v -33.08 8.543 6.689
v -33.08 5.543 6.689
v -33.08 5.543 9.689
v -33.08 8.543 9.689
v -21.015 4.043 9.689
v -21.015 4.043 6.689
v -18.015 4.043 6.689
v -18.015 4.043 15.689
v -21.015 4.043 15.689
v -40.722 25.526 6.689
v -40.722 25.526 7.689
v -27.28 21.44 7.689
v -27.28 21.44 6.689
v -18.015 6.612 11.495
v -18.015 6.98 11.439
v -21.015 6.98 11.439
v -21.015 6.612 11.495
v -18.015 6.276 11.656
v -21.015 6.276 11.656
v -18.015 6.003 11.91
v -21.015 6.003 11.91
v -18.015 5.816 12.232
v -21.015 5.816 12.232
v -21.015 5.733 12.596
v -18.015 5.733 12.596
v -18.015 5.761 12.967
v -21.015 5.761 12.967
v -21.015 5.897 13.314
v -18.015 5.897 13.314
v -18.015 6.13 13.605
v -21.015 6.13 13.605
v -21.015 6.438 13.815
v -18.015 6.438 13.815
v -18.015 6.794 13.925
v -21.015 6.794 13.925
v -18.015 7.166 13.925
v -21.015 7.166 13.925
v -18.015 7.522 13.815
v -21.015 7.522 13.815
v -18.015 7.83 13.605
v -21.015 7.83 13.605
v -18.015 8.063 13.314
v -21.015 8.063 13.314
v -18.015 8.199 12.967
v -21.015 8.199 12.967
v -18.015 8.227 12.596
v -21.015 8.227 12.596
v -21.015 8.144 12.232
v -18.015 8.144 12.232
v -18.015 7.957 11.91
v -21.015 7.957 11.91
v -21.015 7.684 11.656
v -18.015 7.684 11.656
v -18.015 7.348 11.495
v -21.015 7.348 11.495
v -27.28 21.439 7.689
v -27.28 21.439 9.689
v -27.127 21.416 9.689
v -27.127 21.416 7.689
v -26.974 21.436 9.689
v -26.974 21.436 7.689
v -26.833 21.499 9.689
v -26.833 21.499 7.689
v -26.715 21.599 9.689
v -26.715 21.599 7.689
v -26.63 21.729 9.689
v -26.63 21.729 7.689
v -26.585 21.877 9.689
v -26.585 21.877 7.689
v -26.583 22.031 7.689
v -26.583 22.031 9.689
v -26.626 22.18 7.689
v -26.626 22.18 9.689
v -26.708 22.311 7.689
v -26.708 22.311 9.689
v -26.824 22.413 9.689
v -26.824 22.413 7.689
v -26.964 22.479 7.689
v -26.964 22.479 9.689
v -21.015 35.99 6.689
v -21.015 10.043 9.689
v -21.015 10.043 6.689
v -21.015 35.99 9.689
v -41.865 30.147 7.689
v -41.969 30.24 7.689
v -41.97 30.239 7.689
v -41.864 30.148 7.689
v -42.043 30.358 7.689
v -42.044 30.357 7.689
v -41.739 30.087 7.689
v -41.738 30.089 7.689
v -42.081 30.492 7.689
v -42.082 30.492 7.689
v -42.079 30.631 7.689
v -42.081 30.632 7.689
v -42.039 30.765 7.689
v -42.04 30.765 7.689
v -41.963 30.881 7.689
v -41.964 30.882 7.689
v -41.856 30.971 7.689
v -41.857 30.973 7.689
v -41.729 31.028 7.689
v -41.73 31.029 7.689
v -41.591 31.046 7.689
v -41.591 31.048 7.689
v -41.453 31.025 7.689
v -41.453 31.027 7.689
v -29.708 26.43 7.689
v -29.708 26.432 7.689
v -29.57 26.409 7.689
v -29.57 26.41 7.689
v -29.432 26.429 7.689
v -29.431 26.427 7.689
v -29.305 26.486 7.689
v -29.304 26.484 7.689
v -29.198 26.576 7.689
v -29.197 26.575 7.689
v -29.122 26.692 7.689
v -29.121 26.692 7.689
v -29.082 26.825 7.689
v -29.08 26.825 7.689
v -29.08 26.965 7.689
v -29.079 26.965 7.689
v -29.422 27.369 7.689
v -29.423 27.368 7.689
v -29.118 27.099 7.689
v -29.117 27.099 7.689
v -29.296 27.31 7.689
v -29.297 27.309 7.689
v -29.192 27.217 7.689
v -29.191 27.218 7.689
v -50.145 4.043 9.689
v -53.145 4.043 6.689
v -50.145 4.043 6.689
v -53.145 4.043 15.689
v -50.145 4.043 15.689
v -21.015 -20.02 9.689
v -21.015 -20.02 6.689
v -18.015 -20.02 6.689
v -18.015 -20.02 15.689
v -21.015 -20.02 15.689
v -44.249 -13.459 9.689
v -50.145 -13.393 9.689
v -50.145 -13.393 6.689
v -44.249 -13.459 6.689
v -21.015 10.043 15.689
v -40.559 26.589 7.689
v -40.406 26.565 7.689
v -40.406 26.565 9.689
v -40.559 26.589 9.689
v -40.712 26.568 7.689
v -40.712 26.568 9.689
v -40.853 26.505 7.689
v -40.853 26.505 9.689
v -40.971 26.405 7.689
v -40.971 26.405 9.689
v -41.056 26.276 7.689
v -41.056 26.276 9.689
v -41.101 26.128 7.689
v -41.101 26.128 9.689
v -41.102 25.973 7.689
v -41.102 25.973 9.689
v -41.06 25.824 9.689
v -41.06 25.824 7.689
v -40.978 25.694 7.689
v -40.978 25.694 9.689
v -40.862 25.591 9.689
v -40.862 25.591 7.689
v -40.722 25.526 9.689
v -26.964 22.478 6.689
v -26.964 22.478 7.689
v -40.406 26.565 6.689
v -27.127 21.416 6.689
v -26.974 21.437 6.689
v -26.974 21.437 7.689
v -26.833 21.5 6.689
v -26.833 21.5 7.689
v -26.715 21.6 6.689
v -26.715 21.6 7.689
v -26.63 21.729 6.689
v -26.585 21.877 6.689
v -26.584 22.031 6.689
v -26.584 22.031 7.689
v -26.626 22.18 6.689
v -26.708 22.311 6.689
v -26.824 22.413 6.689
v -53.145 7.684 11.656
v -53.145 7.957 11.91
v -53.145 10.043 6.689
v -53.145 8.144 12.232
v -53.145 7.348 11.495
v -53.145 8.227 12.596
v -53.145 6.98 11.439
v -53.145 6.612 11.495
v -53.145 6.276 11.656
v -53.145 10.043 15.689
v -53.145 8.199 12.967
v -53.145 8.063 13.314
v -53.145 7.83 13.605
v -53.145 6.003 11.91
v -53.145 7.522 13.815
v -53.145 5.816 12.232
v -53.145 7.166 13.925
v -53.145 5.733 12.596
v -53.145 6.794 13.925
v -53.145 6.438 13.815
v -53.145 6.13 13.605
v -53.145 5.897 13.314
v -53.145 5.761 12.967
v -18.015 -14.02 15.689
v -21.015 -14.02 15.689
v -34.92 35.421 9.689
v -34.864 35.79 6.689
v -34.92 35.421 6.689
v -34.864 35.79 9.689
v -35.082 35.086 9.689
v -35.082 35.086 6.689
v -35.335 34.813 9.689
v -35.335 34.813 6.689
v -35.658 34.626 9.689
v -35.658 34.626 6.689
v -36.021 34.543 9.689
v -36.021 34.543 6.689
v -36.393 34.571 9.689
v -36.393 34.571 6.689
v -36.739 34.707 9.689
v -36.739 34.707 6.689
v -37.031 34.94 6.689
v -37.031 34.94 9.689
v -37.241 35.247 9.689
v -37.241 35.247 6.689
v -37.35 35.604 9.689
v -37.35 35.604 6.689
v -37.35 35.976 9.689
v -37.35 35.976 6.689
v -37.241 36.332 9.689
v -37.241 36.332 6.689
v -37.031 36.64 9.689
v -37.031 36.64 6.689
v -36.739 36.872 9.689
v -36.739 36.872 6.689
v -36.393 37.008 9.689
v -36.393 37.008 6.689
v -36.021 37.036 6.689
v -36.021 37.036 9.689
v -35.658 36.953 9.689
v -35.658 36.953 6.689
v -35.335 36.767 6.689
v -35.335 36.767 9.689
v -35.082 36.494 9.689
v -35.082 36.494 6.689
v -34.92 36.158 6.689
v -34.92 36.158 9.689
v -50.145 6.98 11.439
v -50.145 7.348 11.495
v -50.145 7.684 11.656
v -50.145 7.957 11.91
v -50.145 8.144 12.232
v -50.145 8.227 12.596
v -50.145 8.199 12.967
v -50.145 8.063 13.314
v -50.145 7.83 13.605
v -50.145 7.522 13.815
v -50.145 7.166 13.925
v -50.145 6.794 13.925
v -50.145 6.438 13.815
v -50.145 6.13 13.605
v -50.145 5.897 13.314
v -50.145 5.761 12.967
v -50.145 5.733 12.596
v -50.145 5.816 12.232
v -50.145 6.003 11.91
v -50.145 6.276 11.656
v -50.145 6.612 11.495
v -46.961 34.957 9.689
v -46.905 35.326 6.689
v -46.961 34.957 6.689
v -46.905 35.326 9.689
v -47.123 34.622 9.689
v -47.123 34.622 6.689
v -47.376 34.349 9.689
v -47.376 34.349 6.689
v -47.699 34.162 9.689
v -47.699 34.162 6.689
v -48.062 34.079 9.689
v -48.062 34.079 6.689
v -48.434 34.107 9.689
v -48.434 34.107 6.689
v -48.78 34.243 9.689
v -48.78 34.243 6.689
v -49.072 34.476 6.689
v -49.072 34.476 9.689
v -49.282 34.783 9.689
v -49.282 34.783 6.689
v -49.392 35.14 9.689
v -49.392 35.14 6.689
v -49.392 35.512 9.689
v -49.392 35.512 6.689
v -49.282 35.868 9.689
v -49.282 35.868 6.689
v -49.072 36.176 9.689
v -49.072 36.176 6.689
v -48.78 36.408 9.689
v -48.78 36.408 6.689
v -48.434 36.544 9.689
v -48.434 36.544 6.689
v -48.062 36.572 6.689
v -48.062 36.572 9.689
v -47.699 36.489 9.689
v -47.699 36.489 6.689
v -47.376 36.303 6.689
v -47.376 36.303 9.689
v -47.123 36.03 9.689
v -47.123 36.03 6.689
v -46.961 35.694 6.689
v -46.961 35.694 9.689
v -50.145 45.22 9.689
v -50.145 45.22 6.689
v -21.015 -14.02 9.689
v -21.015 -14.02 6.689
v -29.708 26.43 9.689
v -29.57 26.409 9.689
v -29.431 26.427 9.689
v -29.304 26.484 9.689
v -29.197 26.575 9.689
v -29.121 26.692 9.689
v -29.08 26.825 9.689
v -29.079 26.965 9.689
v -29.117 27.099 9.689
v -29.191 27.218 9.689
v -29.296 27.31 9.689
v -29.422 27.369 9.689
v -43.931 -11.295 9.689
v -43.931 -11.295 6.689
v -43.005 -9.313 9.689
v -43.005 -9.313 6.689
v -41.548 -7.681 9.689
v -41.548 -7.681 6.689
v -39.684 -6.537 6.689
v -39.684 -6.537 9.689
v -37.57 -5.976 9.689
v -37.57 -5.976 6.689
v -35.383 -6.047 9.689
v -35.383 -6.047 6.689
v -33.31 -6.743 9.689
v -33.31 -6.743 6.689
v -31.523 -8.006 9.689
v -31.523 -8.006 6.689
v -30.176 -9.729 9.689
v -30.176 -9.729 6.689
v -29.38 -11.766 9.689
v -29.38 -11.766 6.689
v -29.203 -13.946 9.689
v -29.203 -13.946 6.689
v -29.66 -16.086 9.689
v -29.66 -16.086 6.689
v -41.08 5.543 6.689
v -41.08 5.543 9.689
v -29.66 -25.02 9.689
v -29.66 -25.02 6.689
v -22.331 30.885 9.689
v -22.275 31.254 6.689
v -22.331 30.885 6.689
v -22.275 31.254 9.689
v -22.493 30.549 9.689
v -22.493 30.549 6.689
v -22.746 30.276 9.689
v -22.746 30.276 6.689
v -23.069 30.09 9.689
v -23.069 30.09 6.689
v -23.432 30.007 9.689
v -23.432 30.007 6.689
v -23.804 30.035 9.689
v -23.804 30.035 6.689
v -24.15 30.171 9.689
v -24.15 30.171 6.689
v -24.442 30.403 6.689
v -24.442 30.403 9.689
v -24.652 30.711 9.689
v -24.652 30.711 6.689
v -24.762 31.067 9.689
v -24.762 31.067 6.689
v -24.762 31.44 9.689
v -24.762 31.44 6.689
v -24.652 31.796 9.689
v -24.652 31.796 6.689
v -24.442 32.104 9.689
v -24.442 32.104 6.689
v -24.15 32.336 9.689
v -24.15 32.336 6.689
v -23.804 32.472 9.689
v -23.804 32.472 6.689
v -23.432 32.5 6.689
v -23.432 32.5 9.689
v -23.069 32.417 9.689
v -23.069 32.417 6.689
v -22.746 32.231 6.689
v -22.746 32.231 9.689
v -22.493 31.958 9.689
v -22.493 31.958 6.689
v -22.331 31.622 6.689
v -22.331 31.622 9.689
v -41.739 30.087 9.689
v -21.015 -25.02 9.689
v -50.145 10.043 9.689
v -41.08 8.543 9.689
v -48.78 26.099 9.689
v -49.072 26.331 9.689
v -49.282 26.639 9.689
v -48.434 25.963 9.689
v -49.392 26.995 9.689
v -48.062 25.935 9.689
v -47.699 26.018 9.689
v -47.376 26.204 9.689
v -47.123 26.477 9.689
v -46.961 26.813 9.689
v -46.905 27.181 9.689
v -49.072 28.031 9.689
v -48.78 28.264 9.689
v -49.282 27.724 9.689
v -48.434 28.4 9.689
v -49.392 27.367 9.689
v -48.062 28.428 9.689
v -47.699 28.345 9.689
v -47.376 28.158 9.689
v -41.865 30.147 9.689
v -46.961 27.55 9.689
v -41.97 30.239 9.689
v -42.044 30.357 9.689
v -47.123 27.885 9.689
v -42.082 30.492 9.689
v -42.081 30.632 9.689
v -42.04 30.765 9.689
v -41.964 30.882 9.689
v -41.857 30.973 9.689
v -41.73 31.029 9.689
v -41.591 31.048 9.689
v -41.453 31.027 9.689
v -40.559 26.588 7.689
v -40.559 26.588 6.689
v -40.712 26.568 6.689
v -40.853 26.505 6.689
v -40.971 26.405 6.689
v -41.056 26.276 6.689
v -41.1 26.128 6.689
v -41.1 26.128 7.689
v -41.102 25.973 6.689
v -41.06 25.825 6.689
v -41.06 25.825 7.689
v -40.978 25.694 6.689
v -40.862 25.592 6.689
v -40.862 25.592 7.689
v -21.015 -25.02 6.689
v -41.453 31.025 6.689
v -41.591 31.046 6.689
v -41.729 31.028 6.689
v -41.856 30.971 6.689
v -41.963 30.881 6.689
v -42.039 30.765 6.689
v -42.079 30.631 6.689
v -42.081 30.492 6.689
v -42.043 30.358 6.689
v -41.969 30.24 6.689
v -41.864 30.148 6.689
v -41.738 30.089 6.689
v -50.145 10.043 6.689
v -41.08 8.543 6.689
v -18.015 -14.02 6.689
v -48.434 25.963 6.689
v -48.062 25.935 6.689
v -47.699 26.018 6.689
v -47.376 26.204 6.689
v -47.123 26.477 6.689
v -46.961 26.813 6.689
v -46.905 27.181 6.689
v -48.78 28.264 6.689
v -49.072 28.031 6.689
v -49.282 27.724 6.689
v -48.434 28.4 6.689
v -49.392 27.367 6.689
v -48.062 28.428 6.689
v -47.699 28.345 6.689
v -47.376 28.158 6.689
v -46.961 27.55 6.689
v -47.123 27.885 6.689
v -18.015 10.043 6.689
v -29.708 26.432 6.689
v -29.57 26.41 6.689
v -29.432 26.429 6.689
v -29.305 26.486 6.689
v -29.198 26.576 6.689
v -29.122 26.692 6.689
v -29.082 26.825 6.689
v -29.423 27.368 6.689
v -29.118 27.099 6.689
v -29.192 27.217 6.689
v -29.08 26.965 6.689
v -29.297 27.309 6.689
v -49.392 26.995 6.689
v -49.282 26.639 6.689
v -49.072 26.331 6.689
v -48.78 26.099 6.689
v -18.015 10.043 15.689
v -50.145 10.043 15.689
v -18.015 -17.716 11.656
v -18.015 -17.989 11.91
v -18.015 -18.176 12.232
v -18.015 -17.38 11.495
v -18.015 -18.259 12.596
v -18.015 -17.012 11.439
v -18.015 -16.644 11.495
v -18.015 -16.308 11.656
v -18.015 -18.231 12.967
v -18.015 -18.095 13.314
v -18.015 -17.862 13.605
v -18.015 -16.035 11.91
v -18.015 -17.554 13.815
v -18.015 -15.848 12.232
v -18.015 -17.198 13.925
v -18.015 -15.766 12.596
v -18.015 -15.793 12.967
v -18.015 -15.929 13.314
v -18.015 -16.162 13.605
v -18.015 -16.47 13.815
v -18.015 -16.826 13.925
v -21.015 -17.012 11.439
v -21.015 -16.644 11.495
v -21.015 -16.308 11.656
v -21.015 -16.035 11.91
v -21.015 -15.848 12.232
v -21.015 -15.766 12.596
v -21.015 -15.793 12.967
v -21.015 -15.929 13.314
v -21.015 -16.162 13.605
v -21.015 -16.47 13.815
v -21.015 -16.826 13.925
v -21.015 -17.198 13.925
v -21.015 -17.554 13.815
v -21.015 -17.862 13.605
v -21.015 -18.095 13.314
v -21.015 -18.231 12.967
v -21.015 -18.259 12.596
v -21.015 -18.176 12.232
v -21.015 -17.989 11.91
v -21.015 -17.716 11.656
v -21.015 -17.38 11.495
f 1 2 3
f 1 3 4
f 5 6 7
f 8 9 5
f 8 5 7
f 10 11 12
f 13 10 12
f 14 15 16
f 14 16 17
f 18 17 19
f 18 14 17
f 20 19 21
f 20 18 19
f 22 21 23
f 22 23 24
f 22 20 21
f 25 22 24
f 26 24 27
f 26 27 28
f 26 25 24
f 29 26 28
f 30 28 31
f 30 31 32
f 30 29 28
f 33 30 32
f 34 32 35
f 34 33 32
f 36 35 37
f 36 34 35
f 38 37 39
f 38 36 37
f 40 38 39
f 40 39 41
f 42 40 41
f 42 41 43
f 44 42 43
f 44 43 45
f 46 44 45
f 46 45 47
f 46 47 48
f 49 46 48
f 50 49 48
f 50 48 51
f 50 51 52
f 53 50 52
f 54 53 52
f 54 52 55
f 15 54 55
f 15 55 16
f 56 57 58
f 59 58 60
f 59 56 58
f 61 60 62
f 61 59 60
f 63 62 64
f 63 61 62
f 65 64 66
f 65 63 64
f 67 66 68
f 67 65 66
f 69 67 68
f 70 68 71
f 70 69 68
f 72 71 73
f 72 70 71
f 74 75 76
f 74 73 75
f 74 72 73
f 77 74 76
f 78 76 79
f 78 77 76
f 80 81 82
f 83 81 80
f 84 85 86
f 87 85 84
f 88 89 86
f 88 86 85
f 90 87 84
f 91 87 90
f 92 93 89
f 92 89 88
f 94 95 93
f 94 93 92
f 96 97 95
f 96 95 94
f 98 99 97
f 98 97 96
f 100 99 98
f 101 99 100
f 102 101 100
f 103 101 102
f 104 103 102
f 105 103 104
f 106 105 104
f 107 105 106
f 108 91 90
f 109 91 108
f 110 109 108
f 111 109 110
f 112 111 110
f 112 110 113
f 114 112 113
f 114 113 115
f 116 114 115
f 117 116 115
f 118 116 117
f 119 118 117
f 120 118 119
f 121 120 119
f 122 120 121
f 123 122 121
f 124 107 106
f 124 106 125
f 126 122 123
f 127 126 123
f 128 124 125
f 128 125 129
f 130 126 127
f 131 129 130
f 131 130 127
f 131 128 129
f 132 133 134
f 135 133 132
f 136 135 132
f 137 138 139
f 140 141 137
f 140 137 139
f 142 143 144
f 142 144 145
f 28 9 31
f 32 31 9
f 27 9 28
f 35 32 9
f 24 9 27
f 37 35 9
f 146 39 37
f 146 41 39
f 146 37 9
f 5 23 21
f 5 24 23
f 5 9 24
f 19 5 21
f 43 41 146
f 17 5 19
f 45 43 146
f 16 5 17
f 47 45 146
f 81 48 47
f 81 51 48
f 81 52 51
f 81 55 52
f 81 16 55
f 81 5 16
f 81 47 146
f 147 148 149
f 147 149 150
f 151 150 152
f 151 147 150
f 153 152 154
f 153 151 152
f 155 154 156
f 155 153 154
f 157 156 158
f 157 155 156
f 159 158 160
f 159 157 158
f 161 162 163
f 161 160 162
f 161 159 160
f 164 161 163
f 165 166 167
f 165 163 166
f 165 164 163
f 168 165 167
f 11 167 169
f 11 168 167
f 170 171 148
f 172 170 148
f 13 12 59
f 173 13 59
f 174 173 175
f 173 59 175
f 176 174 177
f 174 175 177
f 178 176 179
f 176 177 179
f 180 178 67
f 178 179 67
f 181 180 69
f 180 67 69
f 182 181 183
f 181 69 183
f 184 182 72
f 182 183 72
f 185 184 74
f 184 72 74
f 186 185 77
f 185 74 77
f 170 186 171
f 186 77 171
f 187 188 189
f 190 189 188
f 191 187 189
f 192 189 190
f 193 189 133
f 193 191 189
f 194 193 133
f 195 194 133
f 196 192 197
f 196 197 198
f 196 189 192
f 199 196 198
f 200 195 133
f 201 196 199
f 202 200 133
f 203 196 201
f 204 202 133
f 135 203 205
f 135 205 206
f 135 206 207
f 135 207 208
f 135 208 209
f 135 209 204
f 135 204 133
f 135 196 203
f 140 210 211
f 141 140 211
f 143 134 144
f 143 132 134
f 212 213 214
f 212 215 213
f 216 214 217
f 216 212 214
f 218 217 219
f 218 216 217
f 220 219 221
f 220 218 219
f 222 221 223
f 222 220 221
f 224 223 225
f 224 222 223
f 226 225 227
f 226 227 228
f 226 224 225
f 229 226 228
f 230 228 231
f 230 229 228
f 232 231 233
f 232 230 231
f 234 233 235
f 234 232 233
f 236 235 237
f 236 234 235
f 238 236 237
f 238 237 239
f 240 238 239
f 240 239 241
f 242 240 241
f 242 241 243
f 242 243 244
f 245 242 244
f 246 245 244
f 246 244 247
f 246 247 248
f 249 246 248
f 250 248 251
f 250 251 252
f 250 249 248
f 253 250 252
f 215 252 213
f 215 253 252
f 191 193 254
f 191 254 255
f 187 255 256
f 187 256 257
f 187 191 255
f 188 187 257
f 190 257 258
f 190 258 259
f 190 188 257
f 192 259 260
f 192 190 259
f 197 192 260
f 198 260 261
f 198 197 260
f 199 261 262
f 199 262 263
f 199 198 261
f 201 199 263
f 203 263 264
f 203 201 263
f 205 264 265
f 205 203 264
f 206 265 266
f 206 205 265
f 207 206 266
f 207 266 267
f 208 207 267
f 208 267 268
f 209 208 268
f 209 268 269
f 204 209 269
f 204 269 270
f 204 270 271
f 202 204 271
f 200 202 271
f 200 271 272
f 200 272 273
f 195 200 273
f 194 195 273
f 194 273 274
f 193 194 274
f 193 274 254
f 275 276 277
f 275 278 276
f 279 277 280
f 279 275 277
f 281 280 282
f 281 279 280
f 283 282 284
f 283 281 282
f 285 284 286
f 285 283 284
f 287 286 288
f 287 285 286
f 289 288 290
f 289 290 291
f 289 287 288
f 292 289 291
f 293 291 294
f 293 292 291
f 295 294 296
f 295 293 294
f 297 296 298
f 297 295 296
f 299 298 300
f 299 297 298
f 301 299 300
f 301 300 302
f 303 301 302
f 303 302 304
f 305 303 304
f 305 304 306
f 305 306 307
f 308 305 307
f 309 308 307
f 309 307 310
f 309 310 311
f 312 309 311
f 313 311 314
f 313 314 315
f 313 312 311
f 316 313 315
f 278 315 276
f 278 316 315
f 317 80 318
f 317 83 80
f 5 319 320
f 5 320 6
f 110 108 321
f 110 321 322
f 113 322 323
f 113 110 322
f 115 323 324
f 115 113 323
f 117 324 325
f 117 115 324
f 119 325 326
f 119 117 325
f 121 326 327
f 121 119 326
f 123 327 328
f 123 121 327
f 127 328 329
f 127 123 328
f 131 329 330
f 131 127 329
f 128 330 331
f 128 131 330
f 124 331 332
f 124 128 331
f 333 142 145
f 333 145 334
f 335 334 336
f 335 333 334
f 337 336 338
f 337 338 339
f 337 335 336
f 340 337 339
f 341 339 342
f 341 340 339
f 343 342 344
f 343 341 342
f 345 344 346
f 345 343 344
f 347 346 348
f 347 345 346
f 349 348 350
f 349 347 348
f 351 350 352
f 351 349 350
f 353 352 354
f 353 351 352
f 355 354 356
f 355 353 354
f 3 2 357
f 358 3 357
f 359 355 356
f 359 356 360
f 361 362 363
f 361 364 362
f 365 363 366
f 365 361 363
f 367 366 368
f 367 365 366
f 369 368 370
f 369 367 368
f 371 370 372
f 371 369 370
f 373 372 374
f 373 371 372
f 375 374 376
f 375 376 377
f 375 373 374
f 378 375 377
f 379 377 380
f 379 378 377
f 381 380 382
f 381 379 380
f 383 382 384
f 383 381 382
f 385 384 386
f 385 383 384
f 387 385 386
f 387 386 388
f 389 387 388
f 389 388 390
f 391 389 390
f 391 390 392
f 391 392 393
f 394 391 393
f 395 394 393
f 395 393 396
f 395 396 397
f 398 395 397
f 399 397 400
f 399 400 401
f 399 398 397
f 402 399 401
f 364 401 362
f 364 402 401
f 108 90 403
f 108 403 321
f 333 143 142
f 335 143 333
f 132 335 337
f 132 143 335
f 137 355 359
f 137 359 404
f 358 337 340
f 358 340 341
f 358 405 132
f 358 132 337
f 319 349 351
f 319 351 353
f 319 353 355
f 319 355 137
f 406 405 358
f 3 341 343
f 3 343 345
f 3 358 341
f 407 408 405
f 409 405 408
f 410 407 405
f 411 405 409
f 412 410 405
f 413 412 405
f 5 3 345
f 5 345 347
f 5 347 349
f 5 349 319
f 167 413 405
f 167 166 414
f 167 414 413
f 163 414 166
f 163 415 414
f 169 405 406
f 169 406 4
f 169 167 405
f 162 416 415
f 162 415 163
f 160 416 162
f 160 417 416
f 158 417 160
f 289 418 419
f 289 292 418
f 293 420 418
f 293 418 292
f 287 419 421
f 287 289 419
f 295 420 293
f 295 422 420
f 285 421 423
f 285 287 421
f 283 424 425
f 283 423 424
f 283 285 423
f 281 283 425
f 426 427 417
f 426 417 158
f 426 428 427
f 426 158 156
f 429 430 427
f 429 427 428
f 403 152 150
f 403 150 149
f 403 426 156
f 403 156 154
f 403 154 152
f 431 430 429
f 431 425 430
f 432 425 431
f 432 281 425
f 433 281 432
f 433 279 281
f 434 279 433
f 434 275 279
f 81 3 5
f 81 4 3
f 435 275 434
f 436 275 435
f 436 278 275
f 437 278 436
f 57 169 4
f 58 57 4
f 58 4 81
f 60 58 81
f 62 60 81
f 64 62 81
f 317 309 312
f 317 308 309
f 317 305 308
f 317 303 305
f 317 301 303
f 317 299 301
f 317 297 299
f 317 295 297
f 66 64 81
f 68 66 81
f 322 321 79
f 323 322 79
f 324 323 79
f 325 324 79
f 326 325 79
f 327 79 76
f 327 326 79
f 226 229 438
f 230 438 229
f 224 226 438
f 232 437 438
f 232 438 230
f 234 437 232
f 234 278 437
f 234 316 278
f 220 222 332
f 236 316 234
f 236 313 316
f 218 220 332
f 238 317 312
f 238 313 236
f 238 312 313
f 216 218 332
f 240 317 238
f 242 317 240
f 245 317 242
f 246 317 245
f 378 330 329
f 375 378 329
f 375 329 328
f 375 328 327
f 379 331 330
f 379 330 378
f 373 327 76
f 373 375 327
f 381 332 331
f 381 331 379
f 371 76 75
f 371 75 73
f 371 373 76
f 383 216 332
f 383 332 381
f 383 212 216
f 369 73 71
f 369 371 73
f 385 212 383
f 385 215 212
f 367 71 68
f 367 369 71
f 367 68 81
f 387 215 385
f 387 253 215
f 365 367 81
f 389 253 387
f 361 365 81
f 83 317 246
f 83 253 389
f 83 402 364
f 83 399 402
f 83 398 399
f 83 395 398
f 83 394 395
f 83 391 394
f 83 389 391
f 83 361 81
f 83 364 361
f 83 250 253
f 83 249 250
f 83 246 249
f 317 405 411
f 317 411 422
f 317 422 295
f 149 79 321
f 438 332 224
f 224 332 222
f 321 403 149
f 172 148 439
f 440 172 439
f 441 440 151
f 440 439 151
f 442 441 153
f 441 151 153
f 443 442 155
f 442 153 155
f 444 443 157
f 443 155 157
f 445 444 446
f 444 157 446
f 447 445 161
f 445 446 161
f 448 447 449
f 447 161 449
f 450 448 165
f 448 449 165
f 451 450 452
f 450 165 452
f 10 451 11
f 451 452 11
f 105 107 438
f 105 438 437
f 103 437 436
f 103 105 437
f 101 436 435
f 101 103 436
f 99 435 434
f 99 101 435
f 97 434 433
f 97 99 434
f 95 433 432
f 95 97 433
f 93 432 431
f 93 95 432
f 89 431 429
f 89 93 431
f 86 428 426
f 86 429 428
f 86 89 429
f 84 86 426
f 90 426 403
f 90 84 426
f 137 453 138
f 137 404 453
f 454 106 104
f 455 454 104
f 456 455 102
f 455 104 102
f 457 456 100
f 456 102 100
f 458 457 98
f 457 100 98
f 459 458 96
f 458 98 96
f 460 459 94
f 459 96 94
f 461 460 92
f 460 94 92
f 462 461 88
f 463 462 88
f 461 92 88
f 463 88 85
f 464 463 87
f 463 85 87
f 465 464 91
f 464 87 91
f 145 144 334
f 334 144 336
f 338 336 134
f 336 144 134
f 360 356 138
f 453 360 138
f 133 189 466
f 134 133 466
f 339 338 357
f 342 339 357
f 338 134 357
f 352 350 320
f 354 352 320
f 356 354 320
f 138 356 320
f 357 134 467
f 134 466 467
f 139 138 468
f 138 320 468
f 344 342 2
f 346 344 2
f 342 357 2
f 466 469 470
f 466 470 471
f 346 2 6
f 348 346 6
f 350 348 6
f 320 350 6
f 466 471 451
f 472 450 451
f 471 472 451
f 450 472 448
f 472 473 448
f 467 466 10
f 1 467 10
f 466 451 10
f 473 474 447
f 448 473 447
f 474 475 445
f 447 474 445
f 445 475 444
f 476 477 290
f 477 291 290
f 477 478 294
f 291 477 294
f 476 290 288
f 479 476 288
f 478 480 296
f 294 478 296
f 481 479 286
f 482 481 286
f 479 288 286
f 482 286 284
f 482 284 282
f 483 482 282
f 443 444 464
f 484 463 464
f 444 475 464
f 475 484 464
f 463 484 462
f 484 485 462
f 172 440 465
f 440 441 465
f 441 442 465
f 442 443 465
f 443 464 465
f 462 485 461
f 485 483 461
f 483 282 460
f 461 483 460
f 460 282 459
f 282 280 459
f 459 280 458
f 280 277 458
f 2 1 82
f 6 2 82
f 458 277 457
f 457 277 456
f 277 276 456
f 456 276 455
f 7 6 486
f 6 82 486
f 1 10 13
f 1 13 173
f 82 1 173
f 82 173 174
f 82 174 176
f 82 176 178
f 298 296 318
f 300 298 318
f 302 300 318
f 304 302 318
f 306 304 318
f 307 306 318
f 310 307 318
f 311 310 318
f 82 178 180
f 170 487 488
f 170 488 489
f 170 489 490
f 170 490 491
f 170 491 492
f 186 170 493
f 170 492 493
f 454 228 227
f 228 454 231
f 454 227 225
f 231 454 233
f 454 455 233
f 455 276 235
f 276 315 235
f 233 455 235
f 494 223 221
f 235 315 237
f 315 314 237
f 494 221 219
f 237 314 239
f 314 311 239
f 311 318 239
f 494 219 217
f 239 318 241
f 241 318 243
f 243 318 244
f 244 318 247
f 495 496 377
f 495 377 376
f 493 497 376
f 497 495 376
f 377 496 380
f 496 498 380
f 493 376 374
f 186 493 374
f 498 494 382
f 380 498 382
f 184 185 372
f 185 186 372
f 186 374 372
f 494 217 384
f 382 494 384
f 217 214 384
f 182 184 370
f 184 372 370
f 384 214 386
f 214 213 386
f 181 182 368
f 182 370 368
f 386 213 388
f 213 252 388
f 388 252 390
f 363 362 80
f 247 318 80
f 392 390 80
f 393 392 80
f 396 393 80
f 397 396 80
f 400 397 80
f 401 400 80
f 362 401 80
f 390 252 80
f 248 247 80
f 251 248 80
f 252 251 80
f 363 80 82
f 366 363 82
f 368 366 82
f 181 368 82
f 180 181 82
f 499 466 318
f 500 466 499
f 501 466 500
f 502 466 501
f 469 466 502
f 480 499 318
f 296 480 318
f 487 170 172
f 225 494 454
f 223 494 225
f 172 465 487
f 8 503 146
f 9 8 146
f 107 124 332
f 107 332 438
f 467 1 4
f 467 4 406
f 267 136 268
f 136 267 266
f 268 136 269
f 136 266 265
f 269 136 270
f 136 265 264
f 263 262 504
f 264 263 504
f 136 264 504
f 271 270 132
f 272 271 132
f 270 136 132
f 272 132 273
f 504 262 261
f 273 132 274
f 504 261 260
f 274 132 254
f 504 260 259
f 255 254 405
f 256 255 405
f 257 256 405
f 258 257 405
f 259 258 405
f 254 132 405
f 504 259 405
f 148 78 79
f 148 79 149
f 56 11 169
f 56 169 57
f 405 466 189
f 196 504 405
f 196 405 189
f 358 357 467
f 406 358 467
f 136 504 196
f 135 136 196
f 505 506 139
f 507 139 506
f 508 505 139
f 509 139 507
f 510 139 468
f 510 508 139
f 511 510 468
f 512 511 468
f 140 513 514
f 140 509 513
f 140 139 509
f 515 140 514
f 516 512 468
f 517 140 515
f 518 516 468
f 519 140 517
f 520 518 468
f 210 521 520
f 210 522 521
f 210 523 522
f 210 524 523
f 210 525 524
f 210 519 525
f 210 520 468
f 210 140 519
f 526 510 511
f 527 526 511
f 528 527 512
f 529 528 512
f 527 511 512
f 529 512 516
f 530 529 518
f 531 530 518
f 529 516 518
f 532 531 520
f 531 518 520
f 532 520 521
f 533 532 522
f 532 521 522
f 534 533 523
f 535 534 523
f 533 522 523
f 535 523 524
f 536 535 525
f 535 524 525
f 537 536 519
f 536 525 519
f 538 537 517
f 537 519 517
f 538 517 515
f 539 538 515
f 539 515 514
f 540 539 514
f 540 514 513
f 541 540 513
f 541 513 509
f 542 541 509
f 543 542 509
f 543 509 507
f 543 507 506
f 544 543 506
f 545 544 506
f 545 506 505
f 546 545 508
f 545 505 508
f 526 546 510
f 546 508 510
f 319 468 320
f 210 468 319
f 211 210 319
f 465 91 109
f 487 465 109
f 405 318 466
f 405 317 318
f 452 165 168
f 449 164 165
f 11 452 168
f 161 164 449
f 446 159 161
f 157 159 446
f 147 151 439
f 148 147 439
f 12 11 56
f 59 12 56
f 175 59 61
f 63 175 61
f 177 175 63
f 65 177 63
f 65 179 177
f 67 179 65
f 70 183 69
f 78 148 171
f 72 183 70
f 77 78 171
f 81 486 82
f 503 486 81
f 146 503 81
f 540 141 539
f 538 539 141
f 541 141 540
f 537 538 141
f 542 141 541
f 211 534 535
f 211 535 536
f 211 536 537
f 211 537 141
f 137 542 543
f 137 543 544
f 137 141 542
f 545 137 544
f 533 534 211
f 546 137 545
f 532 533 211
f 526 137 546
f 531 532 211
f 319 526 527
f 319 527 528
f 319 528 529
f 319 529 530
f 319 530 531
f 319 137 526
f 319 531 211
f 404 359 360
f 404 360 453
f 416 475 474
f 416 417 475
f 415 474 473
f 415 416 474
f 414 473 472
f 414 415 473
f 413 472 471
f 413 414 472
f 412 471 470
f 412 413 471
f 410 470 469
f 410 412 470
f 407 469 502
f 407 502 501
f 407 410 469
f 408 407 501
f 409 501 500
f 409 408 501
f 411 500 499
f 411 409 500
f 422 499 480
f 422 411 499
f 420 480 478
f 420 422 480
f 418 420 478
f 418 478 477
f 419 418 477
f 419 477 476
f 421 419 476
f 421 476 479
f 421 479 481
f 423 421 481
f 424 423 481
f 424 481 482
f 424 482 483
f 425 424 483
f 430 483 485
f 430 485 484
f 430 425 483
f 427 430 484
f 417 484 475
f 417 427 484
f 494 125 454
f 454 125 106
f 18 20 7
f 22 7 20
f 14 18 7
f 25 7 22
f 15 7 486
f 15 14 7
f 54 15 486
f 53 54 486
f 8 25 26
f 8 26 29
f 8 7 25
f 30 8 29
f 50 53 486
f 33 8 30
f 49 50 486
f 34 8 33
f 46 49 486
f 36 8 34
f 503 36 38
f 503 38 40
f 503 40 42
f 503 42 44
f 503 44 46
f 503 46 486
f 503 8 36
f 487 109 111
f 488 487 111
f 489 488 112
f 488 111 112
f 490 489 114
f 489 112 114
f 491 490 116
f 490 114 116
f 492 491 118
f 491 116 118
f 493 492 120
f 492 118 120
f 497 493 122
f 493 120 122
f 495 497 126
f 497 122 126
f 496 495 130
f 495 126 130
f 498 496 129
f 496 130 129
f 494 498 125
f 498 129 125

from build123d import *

# Parameters (mm, degrees)
SKETCH1_W            = 29.13
SKETCH1_H            = 2
BOSS_EXTRUDE1_DEPTH  = 45.22
SKETCH15_W           = 3.835
SKETCH15_H           = 2
BOSS_EXTRUDE7_DEPTH  = 25.02
SKETCH19_W           = 2
SKETCH19_H           = 6
BOSS_EXTRUDE9_DEPTH  = 3
SKETCH20_W           = 3
SKETCH20_H           = 6
BOSS_EXTRUDE10_DEPTH = 6
CUT_EXTRUDE10_DEPTH  = 4
SKETCH27_R           = 1.25
CUT_EXTRUDE13_DEPTH  = 5
CUT_EXTRUDE16_DEPTH  = 4.86
CUT_EXTRUDE20_DEPTH  = 5
SKETCH28_R           = 1.25
CUT_EXTRUDE23_DEPTH  = 5
SKETCH32_R           = 1.25
CUT_EXTRUDE25_DEPTH  = 5
SKETCH38_W           = 2
SKETCH38_H           = 6
BOSS_EXTRUDE11_DEPTH = 3
SKETCH39_W           = 3
SKETCH39_H           = 6
BOSS_EXTRUDE12_DEPTH = 6
SKETCH40_R           = 1.250000005
CUT_EXTRUDE26_DEPTH  = 6
SKETCH51_W           = 2
SKETCH51_H           = 6
BOSS_EXTRUDE15_DEPTH = 3
SKETCH52_W           = 3
SKETCH52_H           = 6
BOSS_EXTRUDE16_DEPTH = 6
SKETCH53_R           = 1.249999995
CUT_EXTRUDE28_DEPTH  = 6
SKETCH54_R           = 1.25
CUT_EXTRUDE29_DEPTH  = 3
CUT_EXTRUDE30_DEPTH  = 10
BOSS_EXTRUDE17_DEPTH = 3
SKETCH57_R           = 1.25
BOSS_EXTRUDE18_DEPTH = 1
SKETCH58_W           = 8
SKETCH58_H           = 3
CUT_EXTRUDE31_DEPTH  = 10


with BuildPart() as part:
    # Sketch1 → Boss-Extrude1 (new body)
    with BuildSketch(Plane(origin=(0, 0, 0), x_dir=(1, 0, 0), z_dir=(0, 1, 0))):
        with Locations((-35.580481579, -22.688974349)):
            Rectangle(SKETCH1_W, SKETCH1_H)
    extrude(amount=BOSS_EXTRUDE1_DEPTH)

    # Sketch15 → Boss-Extrude7 (add)
    with BuildSketch(Plane.XZ):
        with Locations((-22.932981579, 22.688974349)):
            Rectangle(SKETCH15_W, SKETCH15_H)
    extrude(amount=BOSS_EXTRUDE7_DEPTH)

    # Sketch19 → Boss-Extrude9 (add)
    with BuildSketch(Plane(origin=(-21.015481579, 0, 0), x_dir=(0, 0, -1), z_dir=(1, 0, 0))):
        with Locations((-22.688974349, -17.02)):
            Rectangle(SKETCH19_W, SKETCH19_H)
    extrude(amount=BOSS_EXTRUDE9_DEPTH)

    # Sketch20 → Boss-Extrude10 (add)
    with BuildSketch(Plane(origin=(0, 0, 21.688974349), x_dir=(-1, 0, 0), z_dir=(0, 0, -1))):
        with Locations((19.515481579, -17.02)):
            Rectangle(SKETCH20_W, SKETCH20_H)
    extrude(amount=BOSS_EXTRUDE10_DEPTH)

    # Sketch24 → Cut-Extrude10 (cut)
    with BuildSketch(Plane.XY.offset(23.688974349)):
        Polygon((-21.015481579, 45.22), (-21.015481579, 37.57), (-50.145481579, 45.22), align=None)
    extrude(amount=-CUT_EXTRUDE10_DEPTH, mode=Mode.SUBTRACT)

    # Sketch27 → Cut-Extrude13 (cut)
    with BuildSketch(Plane.XY.offset(23.688974349)):
        with Locations((-48.155481573, 35.325814089)):
            Circle(SKETCH27_R)
        with Locations((-48.155481573, 27.181192799)):
            Circle(SKETCH27_R)
    extrude(amount=-CUT_EXTRUDE13_DEPTH, mode=Mode.SUBTRACT)

    # Sketch35 → Cut-Extrude16 (cut)
    with BuildSketch(Plane.XY.offset(23.688974349)):
        Polygon((-21.015481579, 35.99), (-21.015481579, 37.57), (-50.145481579, 45.22), align=None)
    extrude(amount=-CUT_EXTRUDE16_DEPTH, mode=Mode.SUBTRACT)


with BuildPart() as body_2:
    # Mirror1: mirrored copy
    add(part.part.mirror(Plane(origin=(0, 0, 15.688974349), x_dir=(1, 0, 0), z_dir=(0, 0, -1))))

    # Sketch37 → Cut-Extrude20 (cut)
    with BuildSketch(Plane(origin=(0, 0, 7.688974349), x_dir=(-1, 0, 0), z_dir=(0, 0, -1))):
        with BuildLine():
            Line((29.422391304, 27.369440111), (41.452993211, 31.026802565))
            ThreePointArc((41.452993211, 31.026802565), (42.065476612, 30.699897808), (41.738571855, 30.087414406))
            Line((41.738571855, 30.087414406), (29.707969948, 26.430051952))
            ThreePointArc((29.707969948, 26.430051952), (29.095486546, 26.75695671), (29.422391304, 27.369440111))
        make_face()
        with BuildLine():
            Line((26.963881394, 22.478846245), (40.405895564, 26.565285004))
            ThreePointArc((40.405895564, 26.565285004), (41.083801623, 26.203461785), (40.721978404, 25.525555725))
            Line((40.721978404, 25.525555725), (27.279964235, 21.439116966))
            ThreePointArc((27.279964235, 21.439116966), (26.602058175, 21.800940185), (26.963881394, 22.478846245))
        make_face()
    extrude(amount=-CUT_EXTRUDE20_DEPTH, mode=Mode.SUBTRACT)


with BuildPart() as body_2_2:
    # Mirror2: mirrored copy
    add(body_2.part.mirror(Plane.XY.offset(15.688974349)))

    # Sketch28 → Cut-Extrude23 (cut)
    with BuildSketch(Plane.XY.offset(23.688974349)):
        with Locations((-23.525481526, 31.253503444)):
            Circle(SKETCH28_R)
    extrude(amount=-CUT_EXTRUDE23_DEPTH, mode=Mode.SUBTRACT)

    # Sketch32 → Cut-Extrude25 (cut)
    with BuildSketch(Plane.XY.offset(23.688974349)):
        with Locations((-36.114456484, 35.789812978)):
            Circle(SKETCH32_R)
    extrude(amount=-CUT_EXTRUDE25_DEPTH, mode=Mode.SUBTRACT)

    # Sketch38 → Boss-Extrude11 (add)
    with BuildSketch(Plane.ZY.offset(50.145481579)):
        with Locations((22.688974349, 7.042669101)):
            Rectangle(SKETCH38_W, SKETCH38_H)
    extrude(amount=BOSS_EXTRUDE11_DEPTH)

    # Sketch39 → Boss-Extrude12 (add)
    with BuildSketch(Plane(origin=(0, 0, 21.688974349), x_dir=(-1, 0, 0), z_dir=(0, 0, -1))):
        with Locations((51.645481579, 7.042669101)):
            Rectangle(SKETCH39_W, SKETCH39_H)
    extrude(amount=BOSS_EXTRUDE12_DEPTH)

    # Sketch40 → Cut-Extrude26 (cut)
    with BuildSketch(Plane.ZY.offset(53.145481579)):
        with Locations((18.688974344, 6.98)):
            Circle(SKETCH40_R)
    extrude(amount=-CUT_EXTRUDE26_DEPTH, mode=Mode.SUBTRACT)

    # Sketch51 → Boss-Extrude15 (add)
    with BuildSketch(Plane(origin=(-21.015481579, 0, 0), x_dir=(0, 0, -1), z_dir=(1, 0, 0))):
        with Locations((-22.688974349, 7.042669101)):
            Rectangle(SKETCH51_W, SKETCH51_H)
    extrude(amount=BOSS_EXTRUDE15_DEPTH)

    # Sketch52 → Boss-Extrude16 (add)
    with BuildSketch(Plane(origin=(0, 0, 21.688974349), x_dir=(-1, 0, 0), z_dir=(0, 0, -1))):
        with Locations((19.515481579, 7.042669101)):
            Rectangle(SKETCH52_W, SKETCH52_H)
    extrude(amount=BOSS_EXTRUDE16_DEPTH)

    # Sketch53 → Cut-Extrude28 (cut)
    with BuildSketch(Plane(origin=(-18.015481579, 0, 0), x_dir=(0, 0, -1), z_dir=(1, 0, 0))):
        with Locations(Location((-18.688974344, 6.98, 0), (0, 0, 180))):
            Circle(SKETCH53_R)
    extrude(amount=-CUT_EXTRUDE28_DEPTH, mode=Mode.SUBTRACT)


with BuildPart() as body_2_3:
    # Mirror4: mirrored copy
    add(body_2_2.part.mirror(Plane(origin=(0, 0, 15.688974349), x_dir=(1, 0, 0), z_dir=(0, 0, -1))))

    # Sketch54 → Cut-Extrude29 (cut)
    with BuildSketch(Plane(origin=(-18.015481579, 0, 0), x_dir=(0, 0, -1), z_dir=(1, 0, 0))):
        with Locations((-12.688974354, -17.012020694)):
            Circle(SKETCH54_R)
    extrude(amount=-CUT_EXTRUDE29_DEPTH, mode=Mode.SUBTRACT)

    # Sketch55 → Cut-Extrude30 (cut)
    with BuildSketch(Plane(origin=(0, 0, 7.688974349), x_dir=(-1, 0, 0), z_dir=(0, 0, -1))):
        Polygon((24.850481579, 0), (21.015481579, -25.02), (24.850481579, -25.02), align=None)
    extrude(amount=-CUT_EXTRUDE30_DEPTH, mode=Mode.SUBTRACT)

    # Sketch56 → Boss-Extrude17 (add)
    with BuildSketch(Plane.XY.offset(9.688974349)):
        with BuildLine():
            Line((-21.015481579, -25.02), (-24.850481579, 0))
            Line((-24.850481579, 0), (-50.145481579, 0))
            Line((-50.145481579, 0), (-50.145481579, -13.39301212))
            Line((-50.145481579, -13.39301212), (-44.248800379, -13.458826151))
            ThreePointArc((-44.248800379, -13.458826151), (-35.383312942, -6.047023199), (-29.659784654, -16.085594533))
            Line((-29.659784654, -16.085594533), (-29.659784654, -25.02))
            Line((-29.659784654, -25.02), (-21.015481579, -25.02))
        make_face()
    extrude(amount=-BOSS_EXTRUDE17_DEPTH)

    # Sketch57 → Boss-Extrude18 (add)
    with BuildSketch(Plane(origin=(0, 0, 7.688974349), x_dir=(-1, 0, 0), z_dir=(0, 0, -1))):
        Polygon((21.015481579, -25.02), (21.015481579, -20.02), (18.015481579, -20.02), (18.015481579, -14.02), (21.015481579, -14.02), (21.015481579, 4.042669101), (18.015481579, 4.042669101), (18.015481579, 10.042669101), (21.015481579, 10.042669101), (21.015481579, 35.99), (50.145481579, 45.22), (50.145481579, 10.042669101), (53.145481579, 10.042669101), (53.145481579, 4.042669101), (50.145481579, 4.042669101), (50.145481579, 0), (24.850481579, 0), align=None)
        with Locations(Location((23.525481526, 31.253503444, 0), (0, 0, 180))):
            Circle(SKETCH57_R, mode=Mode.SUBTRACT)
        with Locations(Location((36.114456484, 35.789812978, 0), (0, 0, 180))):
            Circle(SKETCH57_R, mode=Mode.SUBTRACT)
        with Locations(Location((48.155481573, 35.325814089, 0), (0, 0, 180))):
            Circle(SKETCH57_R, mode=Mode.SUBTRACT)
        with Locations(Location((48.155481573, 27.181192799, 0), (0, 0, 180))):
            Circle(SKETCH57_R, mode=Mode.SUBTRACT)
        with BuildLine():
            Line((29.422855642, 27.367912705), (41.45345755, 31.025275159))
            ThreePointArc((41.45345755, 31.025275159), (42.063949206, 30.699433469), (41.738107516, 30.088941812))
            Line((41.738107516, 30.088941812), (29.707505609, 26.431579358))
            ThreePointArc((29.707505609, 26.431579358), (29.097013952, 26.757421048), (29.422855642, 27.367912705))
        make_face(mode=Mode.SUBTRACT)
        with BuildLine():
            Line((26.964038287, 22.478330158), (40.406052456, 26.564768917))
            ThreePointArc((40.406052456, 26.564768917), (41.083285536, 26.203304892), (40.721821511, 25.526071812))
            Line((40.721821511, 25.526071812), (27.279807342, 21.439633053))
            ThreePointArc((27.279807342, 21.439633053), (26.602574262, 21.801097078), (26.964038287, 22.478330158))
        make_face(mode=Mode.SUBTRACT)
    extrude(amount=BOSS_EXTRUDE18_DEPTH)

    # Sketch58 → Cut-Extrude31 (cut)
    with BuildSketch(Plane(origin=(0, 0, 6.688974349), x_dir=(-1, 0, 0), z_dir=(0, 0, -1))):
        with Locations((37.080481579, 7.042669101)):
            Rectangle(SKETCH58_W, SKETCH58_H)
    extrude(amount=-CUT_EXTRUDE31_DEPTH, mode=Mode.SUBTRACT)


solid = body_2_3.part
